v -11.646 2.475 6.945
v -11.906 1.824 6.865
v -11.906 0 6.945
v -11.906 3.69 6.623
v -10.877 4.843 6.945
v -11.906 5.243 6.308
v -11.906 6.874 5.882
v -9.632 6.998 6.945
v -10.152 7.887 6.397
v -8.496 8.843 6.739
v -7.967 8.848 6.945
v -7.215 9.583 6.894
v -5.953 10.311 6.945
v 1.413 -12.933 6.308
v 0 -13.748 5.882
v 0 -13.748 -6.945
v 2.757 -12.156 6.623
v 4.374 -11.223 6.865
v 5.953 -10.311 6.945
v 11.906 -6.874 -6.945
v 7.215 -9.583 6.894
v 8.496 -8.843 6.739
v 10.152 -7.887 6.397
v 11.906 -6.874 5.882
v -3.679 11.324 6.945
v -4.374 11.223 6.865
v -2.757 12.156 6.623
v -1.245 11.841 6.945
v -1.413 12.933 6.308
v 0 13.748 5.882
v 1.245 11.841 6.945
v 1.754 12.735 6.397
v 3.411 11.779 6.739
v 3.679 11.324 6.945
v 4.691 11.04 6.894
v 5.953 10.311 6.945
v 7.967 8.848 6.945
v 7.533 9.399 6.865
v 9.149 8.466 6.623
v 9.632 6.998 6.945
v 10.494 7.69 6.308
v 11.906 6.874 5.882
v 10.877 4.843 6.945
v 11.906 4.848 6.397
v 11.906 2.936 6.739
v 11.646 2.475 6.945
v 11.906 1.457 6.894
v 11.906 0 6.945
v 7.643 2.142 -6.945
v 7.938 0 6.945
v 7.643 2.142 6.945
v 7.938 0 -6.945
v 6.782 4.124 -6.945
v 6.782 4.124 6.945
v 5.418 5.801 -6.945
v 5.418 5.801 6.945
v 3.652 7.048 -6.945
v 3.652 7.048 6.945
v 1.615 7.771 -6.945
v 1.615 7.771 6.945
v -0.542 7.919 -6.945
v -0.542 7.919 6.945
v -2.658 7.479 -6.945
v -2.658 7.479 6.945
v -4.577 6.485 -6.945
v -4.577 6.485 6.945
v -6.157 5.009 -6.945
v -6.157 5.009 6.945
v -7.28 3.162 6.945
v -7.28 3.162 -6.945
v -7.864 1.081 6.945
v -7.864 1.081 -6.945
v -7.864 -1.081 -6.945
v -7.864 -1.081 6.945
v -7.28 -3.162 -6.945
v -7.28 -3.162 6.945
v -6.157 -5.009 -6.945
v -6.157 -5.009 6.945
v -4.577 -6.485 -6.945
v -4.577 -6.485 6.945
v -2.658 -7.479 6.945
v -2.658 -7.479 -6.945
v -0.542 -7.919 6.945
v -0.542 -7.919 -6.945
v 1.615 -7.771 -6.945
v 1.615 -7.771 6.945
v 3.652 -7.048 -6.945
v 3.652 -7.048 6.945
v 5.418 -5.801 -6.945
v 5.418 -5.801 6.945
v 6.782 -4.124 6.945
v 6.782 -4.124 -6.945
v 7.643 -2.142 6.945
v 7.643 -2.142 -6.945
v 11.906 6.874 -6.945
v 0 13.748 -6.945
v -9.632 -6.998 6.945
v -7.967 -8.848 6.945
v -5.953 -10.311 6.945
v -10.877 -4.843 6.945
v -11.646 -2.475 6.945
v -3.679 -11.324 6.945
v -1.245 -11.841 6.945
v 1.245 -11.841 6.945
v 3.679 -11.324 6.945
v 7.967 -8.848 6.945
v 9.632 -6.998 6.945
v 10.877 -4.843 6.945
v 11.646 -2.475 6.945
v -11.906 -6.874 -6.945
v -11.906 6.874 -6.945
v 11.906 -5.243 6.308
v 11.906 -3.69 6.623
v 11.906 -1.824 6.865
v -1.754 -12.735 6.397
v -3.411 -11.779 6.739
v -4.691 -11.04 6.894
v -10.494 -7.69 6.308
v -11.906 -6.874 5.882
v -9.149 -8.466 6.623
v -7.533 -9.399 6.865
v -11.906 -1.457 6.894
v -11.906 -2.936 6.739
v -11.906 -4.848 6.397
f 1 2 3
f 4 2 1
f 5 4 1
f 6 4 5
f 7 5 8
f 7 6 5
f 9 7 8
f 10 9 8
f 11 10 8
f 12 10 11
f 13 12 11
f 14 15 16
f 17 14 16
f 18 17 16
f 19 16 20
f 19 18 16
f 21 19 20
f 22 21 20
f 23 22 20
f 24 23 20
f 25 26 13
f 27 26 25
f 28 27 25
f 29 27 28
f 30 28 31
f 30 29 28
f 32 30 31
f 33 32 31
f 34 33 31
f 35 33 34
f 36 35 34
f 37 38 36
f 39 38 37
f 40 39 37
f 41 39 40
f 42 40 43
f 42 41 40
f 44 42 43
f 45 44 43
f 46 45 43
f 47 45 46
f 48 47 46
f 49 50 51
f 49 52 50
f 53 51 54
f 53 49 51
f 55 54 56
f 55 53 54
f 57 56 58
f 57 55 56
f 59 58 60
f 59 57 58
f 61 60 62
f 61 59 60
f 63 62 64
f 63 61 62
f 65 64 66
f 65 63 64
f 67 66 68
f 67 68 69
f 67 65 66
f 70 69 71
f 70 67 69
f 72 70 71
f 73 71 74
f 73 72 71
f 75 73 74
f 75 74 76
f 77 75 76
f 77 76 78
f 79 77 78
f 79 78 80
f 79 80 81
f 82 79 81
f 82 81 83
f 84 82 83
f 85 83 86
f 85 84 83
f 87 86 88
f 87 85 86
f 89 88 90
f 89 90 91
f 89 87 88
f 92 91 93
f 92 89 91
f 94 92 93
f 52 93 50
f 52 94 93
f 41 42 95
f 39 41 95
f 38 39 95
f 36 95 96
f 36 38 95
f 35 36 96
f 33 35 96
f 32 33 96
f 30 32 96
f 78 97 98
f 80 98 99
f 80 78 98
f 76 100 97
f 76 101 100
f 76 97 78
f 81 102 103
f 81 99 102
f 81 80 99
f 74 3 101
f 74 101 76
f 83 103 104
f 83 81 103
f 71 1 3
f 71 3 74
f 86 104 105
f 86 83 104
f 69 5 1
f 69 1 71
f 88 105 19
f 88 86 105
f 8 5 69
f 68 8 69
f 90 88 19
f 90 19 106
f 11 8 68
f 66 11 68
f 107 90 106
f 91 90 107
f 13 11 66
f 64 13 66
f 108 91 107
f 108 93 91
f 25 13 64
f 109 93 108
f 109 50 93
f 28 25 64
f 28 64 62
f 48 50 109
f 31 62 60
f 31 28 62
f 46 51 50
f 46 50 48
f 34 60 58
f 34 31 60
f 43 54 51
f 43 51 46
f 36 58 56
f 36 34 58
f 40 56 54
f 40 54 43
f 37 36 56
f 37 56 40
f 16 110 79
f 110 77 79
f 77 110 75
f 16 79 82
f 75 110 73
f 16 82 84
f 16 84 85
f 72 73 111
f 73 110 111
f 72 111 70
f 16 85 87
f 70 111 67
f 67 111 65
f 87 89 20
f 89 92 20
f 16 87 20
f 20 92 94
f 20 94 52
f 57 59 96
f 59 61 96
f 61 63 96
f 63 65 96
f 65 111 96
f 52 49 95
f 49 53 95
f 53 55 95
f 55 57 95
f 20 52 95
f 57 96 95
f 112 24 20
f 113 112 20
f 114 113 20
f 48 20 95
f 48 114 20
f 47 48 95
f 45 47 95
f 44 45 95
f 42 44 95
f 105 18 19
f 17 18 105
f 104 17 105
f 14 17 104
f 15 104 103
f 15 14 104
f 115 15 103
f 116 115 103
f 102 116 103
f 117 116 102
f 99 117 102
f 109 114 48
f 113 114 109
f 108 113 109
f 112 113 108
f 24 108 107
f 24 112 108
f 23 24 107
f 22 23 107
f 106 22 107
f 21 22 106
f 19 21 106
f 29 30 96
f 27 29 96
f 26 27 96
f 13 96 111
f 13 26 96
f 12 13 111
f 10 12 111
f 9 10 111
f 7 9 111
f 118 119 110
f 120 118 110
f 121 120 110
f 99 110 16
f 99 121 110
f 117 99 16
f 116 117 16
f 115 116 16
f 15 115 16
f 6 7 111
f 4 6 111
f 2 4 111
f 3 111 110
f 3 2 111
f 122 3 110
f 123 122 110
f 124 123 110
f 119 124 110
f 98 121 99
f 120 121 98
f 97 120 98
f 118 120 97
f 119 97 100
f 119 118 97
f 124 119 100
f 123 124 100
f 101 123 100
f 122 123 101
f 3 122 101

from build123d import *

# Parameters (mm, degrees)
SKETCH1_R         = 7.9375
EXTRUDE1_DEPTH    = 6.9453125
SKETCH7_OUTSIDE_W = 121.588
SKETCH7_OUTSIDE_H = 125.272
SKETCH7_OUTSIDE_R = 11.90625
EXTRUDE2_DEPTH    = 25.4
EXTRUDE2_TAPER    = 60


with BuildPart() as part:
    # Sketch1 → Extrude1 (new body, symmetric)
    with BuildSketch(Plane.XY):
        Polygon((-11.90625, 6.874076643), (-11.90625, -6.874076643), (0, -13.748153285), (11.90625, -6.874076643), (11.90625, 6.874076643), (0, 13.748153285), align=None)
        Circle(SKETCH1_R, mode=Mode.SUBTRACT)
    extrude(amount=EXTRUDE1_DEPTH, both=True)

    # Sketch7 outside → Extrude2 (cut)
    with BuildSketch(Plane.XY.offset(6.9453125)):
        Rectangle(SKETCH7_OUTSIDE_W, SKETCH7_OUTSIDE_H)
        Circle(SKETCH7_OUTSIDE_R, mode=Mode.SUBTRACT)
    extrude(amount=-EXTRUDE2_DEPTH, taper=EXTRUDE2_TAPER, mode=Mode.SUBTRACT)


solid = part.part
